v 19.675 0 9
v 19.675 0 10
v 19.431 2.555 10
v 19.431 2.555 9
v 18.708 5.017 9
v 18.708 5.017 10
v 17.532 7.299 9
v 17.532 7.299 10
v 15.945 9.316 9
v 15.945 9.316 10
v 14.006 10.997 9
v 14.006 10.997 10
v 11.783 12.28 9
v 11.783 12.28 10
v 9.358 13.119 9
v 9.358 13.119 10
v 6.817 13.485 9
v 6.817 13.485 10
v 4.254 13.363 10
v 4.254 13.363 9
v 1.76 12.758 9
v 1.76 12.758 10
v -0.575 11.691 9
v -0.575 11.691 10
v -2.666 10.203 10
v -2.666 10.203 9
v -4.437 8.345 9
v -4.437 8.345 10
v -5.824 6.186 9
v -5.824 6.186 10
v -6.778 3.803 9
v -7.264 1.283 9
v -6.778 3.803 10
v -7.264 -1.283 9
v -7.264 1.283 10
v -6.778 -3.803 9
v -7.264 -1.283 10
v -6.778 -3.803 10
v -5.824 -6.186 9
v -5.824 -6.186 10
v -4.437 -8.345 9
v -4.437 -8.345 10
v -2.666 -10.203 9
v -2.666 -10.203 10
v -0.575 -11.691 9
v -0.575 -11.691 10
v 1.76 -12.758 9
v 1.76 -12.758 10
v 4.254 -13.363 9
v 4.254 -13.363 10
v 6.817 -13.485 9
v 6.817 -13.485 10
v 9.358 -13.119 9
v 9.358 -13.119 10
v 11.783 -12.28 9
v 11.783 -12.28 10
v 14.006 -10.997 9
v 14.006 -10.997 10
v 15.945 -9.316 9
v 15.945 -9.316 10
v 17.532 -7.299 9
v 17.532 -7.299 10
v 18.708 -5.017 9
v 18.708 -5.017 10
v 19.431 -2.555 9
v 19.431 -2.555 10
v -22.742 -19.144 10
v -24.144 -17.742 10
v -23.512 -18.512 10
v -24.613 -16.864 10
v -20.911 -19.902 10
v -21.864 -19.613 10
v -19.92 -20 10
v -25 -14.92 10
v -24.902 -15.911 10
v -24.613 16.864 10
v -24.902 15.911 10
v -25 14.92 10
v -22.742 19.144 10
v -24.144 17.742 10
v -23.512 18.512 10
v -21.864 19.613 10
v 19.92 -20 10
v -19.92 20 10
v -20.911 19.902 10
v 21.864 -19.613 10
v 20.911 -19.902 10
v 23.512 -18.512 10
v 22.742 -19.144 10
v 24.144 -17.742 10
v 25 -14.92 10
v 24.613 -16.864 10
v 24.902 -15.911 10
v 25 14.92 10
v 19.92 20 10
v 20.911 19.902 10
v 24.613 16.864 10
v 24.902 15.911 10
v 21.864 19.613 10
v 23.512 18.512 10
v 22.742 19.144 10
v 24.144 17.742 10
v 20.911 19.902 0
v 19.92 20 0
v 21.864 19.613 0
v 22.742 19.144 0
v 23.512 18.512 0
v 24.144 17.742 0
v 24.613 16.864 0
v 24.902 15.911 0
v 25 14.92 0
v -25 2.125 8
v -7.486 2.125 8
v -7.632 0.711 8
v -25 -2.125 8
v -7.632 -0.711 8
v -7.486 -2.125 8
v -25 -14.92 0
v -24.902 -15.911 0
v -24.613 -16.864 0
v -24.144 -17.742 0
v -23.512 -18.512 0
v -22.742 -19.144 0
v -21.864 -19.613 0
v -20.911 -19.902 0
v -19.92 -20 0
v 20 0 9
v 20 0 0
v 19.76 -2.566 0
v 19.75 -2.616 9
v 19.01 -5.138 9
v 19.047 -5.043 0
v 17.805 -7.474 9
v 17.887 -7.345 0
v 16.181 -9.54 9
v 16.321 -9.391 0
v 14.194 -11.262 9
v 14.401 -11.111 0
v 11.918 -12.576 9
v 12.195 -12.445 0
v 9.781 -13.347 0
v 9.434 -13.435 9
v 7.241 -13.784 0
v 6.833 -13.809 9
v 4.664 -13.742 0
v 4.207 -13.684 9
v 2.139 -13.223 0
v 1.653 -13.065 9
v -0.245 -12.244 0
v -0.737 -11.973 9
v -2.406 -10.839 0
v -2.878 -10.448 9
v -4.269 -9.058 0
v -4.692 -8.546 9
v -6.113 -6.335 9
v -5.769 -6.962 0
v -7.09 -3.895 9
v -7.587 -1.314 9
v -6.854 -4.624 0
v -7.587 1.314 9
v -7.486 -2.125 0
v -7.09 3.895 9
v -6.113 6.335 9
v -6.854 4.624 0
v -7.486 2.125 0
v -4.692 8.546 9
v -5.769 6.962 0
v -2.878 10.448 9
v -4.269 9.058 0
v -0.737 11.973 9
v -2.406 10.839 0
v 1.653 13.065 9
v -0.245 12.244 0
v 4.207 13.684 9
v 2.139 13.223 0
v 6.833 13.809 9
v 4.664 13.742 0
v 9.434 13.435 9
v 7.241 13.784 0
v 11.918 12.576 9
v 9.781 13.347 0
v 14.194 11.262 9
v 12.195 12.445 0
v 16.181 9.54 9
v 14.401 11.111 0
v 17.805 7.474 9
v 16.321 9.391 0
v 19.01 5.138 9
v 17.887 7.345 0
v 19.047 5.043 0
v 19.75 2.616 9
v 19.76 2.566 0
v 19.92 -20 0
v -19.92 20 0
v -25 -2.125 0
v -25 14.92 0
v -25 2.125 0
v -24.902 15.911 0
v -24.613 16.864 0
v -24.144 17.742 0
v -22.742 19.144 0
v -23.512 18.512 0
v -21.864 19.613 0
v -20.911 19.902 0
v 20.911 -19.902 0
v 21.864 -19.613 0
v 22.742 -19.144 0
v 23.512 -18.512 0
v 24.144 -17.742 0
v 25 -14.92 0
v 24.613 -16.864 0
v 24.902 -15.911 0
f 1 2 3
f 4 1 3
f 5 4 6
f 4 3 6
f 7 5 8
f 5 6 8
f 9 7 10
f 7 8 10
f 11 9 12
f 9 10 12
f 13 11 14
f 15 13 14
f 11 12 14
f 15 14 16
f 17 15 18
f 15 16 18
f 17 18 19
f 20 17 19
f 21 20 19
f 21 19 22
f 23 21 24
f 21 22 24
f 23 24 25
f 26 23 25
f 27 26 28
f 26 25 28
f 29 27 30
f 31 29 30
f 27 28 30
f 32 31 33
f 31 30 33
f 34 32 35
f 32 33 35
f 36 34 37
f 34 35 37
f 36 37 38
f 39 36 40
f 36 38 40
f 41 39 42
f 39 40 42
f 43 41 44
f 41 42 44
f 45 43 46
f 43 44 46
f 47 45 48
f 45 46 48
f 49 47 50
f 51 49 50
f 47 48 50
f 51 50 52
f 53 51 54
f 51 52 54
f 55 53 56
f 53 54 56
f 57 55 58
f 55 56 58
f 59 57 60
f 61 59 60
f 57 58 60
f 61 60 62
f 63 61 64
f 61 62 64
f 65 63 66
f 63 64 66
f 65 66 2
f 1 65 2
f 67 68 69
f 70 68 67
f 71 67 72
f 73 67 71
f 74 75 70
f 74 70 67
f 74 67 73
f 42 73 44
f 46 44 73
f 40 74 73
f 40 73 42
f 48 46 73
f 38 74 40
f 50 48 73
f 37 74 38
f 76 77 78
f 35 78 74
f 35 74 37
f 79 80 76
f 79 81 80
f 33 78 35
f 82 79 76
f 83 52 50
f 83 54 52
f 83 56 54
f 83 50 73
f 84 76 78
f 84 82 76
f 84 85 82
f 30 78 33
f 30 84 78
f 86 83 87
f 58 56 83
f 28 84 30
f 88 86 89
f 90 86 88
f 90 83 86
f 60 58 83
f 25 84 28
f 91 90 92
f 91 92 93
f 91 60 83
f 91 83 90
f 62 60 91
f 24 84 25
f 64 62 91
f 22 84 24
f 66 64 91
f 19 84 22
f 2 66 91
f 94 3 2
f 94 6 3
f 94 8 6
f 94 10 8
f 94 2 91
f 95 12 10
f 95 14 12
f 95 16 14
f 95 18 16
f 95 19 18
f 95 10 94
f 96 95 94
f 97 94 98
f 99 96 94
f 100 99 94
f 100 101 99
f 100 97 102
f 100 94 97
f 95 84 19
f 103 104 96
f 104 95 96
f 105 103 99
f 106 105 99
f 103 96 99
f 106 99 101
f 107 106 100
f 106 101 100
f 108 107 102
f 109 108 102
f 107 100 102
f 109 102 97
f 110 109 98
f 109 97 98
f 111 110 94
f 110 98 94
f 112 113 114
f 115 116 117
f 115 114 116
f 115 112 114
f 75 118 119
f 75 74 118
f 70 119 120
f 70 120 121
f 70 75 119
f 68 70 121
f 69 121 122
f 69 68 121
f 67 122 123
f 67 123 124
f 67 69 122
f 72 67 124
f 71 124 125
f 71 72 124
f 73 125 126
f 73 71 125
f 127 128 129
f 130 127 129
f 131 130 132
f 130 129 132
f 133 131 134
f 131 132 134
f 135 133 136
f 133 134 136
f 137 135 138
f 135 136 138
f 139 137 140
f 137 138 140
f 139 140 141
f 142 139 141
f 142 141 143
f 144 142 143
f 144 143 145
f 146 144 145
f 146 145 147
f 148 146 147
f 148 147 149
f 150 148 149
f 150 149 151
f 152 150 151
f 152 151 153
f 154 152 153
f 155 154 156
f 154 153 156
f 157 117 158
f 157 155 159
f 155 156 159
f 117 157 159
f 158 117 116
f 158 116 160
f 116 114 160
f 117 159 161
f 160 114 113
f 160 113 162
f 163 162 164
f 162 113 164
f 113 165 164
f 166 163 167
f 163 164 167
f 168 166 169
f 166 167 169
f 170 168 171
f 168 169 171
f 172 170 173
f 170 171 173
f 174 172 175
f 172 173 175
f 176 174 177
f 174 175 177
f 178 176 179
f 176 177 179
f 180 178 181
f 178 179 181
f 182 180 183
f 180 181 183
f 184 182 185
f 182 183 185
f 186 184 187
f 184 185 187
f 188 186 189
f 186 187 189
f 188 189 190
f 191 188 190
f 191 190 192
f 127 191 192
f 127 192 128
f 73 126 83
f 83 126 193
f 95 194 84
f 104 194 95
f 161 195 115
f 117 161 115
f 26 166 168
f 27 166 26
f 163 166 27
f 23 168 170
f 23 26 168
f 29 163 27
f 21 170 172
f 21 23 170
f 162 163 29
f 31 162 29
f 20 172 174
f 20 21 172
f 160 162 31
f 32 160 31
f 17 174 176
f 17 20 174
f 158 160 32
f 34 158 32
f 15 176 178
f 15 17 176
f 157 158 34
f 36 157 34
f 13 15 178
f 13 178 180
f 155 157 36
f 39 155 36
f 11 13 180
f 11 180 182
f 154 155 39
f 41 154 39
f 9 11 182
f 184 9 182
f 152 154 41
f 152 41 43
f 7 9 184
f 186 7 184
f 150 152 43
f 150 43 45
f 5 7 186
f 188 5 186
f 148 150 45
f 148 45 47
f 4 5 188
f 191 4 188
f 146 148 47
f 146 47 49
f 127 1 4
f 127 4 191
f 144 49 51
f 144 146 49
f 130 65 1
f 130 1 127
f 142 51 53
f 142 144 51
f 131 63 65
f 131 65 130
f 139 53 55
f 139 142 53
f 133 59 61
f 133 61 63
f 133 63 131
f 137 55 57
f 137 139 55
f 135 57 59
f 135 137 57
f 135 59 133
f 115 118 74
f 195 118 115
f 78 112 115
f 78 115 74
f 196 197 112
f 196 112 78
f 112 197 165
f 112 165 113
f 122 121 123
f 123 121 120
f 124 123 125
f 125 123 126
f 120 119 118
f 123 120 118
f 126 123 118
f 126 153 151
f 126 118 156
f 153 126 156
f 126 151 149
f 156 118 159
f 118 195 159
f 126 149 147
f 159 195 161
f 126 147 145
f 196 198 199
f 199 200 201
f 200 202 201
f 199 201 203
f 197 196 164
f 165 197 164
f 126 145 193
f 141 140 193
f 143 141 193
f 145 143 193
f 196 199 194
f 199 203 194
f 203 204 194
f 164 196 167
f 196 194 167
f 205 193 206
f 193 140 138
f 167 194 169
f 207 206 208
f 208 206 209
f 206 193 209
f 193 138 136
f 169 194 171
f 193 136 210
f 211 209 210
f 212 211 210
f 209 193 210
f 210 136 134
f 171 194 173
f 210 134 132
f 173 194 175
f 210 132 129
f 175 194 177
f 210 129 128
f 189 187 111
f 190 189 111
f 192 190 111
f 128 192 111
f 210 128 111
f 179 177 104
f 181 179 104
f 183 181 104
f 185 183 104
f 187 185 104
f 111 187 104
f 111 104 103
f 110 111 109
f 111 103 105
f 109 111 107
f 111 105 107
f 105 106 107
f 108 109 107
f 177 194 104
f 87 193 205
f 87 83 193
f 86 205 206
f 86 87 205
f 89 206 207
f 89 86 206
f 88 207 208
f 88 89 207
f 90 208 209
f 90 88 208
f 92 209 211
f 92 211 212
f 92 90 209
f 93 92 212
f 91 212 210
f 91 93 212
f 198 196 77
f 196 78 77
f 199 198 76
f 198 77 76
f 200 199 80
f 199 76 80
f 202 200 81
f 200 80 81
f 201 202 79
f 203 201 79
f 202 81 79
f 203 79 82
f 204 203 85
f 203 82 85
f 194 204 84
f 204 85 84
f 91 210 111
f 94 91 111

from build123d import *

# Parameters (mm, degrees)
F0_W     = 50
F0_H     = 40
F1_DEPTH = 10
F2_R     = 13.825
F3_DEPTH = 9
F4_R     = 13.5
F5_DEPTH = 1
F6_W     = 4.25
F6_H     = 8
F7_DEPTH = 17.515289916
F8_R     = 5.08


with BuildPart() as f1:
    # F0 (on Top) → F1 (new body)
    with BuildSketch(Plane.XY):
        Rectangle(F0_W, F0_H)
    extrude(amount=F1_DEPTH)

    # F2 (on face) → F3 (cut)
    with BuildSketch(Plane(origin=(0, 0, 0), x_dir=(1, 0, 0), z_dir=(0, 0, -1))):
        with Locations((6.175, 0)):
            Circle(F2_R)
    extrude(amount=-F3_DEPTH, mode=Mode.SUBTRACT)

    # F4 (on face) → F5 (cut, through all)
    with BuildSketch(Plane.XY.offset(10)):
        with Locations((6.175, 0)):
            Circle(F4_R)
    extrude(amount=-F5_DEPTH, mode=Mode.SUBTRACT)

    # F6 (on face) → F7 (cut, through all)
    with BuildSketch(Plane(origin=(-25, 0, 0), x_dir=(0, -1, 0), z_dir=(-1, 0, 0))):
        with Locations((0, 4)):
            Rectangle(F6_W, F6_H)
    extrude(amount=-F7_DEPTH, mode=Mode.SUBTRACT)

    # F8
    f8_edges = [f1.edges().sort_by_distance(p)[0] for p in [
        (25, -20, 5),
        (-25, -20, 5),
        (-25, 20, 5),
        (25, 20, 5),
    ]]
    fillet(f8_edges, radius=F8_R)


solid = f1.part
